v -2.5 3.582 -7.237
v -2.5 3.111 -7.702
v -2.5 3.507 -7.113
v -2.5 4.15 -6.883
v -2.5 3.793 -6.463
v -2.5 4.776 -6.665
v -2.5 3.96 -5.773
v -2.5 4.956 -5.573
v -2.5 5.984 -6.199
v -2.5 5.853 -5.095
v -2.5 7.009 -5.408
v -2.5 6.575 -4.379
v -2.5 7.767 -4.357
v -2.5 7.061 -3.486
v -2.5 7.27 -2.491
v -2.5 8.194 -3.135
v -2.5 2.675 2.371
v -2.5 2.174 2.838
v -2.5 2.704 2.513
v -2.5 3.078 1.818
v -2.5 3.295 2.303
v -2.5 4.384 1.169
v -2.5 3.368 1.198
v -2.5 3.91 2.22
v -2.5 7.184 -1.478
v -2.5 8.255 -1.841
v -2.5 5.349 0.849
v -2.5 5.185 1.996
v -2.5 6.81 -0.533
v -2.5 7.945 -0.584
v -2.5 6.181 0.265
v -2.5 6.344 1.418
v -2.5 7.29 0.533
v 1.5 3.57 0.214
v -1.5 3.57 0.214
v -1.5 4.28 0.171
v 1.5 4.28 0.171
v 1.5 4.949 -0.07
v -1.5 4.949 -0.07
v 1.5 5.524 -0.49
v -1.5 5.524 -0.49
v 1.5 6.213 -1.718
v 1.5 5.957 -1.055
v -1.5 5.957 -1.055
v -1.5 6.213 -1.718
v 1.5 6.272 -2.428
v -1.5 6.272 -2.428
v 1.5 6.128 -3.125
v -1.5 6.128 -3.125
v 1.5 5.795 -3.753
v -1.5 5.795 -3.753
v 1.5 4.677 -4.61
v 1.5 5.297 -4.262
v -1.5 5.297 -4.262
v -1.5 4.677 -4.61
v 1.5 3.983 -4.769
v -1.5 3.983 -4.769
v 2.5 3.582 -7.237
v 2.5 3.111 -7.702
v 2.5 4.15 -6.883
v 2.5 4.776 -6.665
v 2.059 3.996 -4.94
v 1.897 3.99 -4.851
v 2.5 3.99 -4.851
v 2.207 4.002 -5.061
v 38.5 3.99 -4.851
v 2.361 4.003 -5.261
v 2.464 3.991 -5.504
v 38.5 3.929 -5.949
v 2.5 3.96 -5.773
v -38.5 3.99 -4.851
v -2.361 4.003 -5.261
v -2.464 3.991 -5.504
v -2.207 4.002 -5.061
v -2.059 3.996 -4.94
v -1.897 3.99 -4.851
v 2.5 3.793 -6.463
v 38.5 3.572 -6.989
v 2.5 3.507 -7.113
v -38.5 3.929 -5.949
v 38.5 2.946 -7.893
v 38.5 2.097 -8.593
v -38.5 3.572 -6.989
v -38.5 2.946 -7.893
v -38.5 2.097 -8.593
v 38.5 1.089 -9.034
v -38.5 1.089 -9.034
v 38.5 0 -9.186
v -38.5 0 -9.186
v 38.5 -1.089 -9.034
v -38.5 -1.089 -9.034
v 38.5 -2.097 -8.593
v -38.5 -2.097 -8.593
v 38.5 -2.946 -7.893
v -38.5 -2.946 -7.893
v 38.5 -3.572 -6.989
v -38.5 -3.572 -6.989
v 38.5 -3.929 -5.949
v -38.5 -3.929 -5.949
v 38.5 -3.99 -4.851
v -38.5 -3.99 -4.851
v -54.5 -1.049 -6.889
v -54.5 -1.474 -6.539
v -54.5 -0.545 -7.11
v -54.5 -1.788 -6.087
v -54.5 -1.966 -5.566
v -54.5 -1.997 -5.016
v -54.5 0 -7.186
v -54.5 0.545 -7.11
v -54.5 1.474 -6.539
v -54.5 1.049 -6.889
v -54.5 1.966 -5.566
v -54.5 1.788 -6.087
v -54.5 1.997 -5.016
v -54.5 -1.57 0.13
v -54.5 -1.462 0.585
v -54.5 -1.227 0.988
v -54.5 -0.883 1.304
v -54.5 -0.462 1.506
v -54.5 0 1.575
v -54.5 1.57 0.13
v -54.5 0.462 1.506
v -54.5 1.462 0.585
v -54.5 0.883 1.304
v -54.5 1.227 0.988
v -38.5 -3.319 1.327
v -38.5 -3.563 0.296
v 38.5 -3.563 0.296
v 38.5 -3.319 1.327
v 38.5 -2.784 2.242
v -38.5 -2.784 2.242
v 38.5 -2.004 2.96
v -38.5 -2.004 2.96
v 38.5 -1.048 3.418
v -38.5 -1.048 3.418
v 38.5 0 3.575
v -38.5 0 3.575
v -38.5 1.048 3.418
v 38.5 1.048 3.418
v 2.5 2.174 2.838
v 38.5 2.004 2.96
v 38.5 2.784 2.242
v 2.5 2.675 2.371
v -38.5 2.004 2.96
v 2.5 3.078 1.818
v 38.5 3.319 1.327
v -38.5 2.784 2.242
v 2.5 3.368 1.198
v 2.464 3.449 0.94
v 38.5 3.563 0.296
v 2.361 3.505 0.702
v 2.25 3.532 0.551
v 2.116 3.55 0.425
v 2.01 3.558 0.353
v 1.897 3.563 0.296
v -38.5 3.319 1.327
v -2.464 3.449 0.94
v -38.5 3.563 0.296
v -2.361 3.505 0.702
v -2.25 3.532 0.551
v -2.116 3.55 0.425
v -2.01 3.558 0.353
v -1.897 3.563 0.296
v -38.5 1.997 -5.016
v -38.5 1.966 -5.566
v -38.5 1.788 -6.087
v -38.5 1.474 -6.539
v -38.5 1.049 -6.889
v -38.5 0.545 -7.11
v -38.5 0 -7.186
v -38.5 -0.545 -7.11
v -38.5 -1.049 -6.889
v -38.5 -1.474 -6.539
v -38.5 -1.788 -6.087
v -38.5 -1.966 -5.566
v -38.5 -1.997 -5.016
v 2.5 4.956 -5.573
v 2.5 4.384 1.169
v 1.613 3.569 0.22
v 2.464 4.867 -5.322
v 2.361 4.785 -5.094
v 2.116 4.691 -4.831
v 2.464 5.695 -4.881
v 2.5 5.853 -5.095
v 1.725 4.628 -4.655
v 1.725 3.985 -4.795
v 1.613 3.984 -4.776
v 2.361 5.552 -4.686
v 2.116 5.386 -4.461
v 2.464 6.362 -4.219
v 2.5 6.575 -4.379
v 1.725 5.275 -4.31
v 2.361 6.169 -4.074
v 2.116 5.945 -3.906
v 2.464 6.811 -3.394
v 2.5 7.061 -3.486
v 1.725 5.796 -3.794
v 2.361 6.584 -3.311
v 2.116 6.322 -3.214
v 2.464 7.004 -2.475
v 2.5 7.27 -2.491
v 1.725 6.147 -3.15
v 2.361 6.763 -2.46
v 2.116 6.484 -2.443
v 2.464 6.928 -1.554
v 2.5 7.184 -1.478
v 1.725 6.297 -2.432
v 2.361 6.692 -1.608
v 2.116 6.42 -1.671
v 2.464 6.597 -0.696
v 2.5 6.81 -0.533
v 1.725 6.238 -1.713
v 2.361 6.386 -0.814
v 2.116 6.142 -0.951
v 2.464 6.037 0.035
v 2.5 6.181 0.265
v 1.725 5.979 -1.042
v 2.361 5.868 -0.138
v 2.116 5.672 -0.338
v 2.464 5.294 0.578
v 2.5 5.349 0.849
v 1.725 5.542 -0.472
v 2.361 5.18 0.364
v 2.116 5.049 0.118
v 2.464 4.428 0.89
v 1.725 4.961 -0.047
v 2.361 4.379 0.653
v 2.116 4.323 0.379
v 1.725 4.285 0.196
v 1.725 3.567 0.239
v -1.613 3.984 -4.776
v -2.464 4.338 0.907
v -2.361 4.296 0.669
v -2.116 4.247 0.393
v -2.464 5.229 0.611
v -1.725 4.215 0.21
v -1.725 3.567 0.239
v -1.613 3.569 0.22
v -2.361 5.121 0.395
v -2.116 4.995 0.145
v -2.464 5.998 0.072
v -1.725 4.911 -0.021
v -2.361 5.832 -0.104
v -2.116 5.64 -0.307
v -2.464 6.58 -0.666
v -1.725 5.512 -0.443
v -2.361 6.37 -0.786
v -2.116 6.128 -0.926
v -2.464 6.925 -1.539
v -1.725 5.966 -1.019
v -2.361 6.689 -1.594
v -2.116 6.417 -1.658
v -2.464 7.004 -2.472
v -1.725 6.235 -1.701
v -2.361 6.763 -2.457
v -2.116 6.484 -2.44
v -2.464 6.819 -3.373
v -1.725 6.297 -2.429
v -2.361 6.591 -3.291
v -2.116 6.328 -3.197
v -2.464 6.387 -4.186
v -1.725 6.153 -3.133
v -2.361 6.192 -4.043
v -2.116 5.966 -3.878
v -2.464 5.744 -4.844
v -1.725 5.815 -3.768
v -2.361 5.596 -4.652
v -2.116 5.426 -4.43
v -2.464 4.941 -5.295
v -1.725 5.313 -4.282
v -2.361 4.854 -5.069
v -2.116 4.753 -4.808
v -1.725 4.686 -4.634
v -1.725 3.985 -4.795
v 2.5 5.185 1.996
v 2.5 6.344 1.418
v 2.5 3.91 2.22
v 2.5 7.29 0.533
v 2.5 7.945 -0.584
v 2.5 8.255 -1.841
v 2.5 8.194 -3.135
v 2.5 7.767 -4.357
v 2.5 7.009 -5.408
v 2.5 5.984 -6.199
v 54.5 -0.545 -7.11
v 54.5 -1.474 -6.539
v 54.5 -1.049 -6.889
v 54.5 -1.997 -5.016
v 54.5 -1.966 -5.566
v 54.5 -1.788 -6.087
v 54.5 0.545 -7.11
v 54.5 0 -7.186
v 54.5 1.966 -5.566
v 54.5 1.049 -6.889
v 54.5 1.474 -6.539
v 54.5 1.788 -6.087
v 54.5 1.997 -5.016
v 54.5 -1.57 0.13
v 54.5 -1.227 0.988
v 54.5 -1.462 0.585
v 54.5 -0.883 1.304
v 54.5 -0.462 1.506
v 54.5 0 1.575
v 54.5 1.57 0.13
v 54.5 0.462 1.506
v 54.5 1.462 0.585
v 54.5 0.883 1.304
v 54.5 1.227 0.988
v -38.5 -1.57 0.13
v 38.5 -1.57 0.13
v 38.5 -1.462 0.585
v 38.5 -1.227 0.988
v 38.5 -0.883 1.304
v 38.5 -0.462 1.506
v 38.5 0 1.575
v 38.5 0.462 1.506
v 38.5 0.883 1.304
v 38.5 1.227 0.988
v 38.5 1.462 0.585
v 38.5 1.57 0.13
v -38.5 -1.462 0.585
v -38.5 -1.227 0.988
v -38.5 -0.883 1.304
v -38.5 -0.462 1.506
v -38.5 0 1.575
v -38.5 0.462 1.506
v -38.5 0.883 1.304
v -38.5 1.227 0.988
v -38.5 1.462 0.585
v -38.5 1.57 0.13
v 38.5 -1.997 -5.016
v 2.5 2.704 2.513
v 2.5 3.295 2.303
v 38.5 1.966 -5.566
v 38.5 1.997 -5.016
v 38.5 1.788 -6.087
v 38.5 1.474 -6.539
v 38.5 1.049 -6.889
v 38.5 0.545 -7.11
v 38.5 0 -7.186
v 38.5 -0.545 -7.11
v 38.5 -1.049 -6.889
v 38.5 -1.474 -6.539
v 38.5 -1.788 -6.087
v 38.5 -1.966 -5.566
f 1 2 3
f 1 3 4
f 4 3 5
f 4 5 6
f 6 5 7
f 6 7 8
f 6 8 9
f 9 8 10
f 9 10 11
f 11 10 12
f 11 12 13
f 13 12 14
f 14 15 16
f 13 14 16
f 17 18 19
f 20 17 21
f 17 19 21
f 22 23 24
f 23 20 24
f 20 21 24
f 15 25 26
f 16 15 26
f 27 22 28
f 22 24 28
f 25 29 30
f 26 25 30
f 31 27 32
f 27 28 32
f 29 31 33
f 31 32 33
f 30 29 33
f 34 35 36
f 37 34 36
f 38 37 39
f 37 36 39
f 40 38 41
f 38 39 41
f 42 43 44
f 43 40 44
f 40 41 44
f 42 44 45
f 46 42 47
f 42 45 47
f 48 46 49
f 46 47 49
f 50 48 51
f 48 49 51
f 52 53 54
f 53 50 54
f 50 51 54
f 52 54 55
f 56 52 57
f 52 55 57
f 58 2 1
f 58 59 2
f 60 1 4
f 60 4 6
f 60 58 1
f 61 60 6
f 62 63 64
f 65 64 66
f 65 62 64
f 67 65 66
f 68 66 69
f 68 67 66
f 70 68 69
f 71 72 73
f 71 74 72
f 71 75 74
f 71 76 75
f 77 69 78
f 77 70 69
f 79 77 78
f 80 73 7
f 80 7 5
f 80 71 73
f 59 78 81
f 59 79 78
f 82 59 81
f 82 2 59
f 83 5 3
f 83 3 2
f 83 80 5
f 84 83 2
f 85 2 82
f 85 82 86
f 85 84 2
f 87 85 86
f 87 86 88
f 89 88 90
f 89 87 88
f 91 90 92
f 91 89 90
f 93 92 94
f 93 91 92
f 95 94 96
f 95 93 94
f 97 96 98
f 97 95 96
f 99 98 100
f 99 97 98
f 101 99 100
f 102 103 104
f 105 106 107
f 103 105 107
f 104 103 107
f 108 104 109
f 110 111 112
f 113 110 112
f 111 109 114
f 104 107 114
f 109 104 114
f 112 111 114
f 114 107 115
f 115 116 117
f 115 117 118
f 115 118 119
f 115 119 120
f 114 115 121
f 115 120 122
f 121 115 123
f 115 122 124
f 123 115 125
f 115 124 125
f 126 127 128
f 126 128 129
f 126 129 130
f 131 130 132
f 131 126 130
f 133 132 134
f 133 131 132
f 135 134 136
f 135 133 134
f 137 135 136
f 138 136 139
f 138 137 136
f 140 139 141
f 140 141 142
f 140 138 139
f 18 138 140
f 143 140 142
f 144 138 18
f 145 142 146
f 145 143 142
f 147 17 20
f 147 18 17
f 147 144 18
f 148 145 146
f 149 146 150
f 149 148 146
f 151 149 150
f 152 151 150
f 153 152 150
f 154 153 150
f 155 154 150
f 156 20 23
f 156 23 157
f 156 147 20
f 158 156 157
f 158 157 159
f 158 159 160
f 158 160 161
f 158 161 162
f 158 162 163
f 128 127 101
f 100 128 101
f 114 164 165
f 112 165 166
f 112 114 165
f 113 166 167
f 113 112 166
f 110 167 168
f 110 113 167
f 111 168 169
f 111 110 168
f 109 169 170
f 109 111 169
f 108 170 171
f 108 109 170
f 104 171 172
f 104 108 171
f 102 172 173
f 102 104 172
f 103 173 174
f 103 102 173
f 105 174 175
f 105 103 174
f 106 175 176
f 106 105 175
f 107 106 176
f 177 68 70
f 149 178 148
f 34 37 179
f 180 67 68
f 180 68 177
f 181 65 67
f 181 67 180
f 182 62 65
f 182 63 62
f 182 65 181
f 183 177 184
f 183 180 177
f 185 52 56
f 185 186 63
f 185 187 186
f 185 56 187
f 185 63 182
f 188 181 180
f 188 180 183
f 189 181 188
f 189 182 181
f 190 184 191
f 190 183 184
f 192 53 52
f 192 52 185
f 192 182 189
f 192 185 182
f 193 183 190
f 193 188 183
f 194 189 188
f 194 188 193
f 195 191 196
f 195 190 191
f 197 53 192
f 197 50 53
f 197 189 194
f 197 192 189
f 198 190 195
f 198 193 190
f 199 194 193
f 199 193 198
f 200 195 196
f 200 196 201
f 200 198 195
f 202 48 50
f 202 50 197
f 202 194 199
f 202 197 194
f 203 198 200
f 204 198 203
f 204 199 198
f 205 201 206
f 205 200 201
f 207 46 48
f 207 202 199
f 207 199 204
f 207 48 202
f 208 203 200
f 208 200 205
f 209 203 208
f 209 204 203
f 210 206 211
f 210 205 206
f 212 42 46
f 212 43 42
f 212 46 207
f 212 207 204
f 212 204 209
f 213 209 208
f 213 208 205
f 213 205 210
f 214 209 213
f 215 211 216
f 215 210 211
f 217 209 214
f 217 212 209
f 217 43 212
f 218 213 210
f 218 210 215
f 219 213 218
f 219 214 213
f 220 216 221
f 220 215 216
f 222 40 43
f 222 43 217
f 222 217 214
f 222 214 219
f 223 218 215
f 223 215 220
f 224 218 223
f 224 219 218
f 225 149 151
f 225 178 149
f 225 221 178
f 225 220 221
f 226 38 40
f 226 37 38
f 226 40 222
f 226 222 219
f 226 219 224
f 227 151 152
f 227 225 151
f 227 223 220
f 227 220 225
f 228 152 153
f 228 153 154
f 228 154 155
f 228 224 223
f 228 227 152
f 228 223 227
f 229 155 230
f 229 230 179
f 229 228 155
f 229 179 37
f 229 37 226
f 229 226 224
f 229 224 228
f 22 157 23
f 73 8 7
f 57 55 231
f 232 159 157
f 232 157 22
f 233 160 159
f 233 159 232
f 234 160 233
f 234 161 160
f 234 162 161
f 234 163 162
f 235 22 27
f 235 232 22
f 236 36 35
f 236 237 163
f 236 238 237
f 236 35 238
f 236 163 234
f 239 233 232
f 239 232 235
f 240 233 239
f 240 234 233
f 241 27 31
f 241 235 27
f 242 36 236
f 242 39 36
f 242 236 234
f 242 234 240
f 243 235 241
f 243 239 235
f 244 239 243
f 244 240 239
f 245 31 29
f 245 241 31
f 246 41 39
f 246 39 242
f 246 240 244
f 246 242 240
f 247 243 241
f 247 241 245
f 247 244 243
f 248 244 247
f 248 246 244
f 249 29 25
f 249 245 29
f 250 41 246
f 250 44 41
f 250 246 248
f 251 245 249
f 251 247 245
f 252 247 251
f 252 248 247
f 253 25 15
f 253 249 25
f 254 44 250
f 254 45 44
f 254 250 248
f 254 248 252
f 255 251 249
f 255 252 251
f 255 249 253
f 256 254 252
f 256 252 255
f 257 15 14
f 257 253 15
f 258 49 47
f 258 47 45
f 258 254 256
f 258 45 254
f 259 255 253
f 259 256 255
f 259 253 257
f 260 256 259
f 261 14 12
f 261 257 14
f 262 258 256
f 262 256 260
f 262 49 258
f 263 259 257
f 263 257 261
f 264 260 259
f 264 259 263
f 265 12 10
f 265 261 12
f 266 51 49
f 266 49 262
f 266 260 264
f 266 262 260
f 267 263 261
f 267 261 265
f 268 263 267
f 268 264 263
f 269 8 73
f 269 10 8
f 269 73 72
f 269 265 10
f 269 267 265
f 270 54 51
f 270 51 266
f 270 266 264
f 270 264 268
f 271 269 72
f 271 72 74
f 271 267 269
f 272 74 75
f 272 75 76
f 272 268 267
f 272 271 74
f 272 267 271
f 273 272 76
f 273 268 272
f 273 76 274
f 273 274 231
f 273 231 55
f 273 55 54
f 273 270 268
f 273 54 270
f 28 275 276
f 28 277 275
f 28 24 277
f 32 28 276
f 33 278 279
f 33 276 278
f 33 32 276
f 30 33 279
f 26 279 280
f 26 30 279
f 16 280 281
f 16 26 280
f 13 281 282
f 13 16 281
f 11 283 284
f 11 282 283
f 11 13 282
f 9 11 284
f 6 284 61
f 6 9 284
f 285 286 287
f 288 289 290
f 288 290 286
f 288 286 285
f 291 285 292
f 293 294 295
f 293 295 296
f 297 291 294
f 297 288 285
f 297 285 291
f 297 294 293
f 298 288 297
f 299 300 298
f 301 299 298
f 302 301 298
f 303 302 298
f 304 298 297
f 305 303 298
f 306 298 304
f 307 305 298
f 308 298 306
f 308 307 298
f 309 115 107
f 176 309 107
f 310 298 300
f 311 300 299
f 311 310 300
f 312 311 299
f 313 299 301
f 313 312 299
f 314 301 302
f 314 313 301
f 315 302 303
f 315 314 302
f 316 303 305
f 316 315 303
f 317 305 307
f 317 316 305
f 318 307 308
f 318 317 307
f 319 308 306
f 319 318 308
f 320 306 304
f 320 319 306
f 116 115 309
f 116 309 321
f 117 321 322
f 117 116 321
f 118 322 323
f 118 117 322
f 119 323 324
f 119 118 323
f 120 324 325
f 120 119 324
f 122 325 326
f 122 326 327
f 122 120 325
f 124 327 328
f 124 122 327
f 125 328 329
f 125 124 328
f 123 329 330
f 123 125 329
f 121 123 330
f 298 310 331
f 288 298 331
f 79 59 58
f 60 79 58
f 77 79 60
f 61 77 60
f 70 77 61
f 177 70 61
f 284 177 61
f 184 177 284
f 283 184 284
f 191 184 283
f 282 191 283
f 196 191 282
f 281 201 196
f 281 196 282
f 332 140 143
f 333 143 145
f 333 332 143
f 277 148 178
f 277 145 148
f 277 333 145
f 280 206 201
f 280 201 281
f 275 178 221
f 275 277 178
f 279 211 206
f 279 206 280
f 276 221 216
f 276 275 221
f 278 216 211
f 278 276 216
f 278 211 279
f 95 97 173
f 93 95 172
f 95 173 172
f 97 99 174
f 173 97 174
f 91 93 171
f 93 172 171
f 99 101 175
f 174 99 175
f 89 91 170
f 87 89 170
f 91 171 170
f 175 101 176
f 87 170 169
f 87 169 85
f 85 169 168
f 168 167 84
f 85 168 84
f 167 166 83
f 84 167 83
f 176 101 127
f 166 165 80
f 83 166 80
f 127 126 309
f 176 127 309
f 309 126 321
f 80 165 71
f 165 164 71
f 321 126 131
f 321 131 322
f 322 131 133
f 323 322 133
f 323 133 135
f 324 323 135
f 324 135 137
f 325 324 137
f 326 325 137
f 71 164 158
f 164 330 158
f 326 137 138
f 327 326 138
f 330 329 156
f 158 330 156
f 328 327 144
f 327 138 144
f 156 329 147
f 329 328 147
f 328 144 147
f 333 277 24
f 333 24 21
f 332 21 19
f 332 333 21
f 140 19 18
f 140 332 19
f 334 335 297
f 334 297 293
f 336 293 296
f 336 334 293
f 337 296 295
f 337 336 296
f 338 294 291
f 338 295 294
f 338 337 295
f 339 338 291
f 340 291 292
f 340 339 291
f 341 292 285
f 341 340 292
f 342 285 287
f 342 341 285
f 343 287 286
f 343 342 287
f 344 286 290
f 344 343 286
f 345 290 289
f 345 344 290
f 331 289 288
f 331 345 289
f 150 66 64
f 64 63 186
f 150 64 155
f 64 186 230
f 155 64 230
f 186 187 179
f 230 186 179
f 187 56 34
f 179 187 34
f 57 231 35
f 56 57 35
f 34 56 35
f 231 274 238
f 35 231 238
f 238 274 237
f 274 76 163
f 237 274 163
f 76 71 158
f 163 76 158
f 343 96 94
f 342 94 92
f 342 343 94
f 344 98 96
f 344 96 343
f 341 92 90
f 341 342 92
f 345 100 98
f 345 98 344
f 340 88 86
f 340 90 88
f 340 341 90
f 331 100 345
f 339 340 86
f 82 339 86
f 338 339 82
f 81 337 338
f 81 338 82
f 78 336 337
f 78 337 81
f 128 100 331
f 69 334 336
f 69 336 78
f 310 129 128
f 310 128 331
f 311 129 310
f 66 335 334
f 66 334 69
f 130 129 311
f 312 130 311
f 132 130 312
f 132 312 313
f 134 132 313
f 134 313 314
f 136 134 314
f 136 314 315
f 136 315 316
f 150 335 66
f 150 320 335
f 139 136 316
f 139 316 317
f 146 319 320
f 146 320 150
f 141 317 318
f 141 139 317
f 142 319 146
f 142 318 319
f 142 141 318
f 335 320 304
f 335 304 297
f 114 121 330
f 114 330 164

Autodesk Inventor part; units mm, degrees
ref_plane "YZ Plane" through (0, 0, 0) normal (1, 0, 0) x (0, 1, 0)
ref_plane "XZ Plane" through (0, 0, 0) normal (0, 1, 0) x (-1, 0, 0)
ref_plane "XY Plane" through (0, 0, 0) normal (0, 0, 1) x (1, 0, 0)
sketch "Sketch1" plane through (0, 0, 0) normal (1, 0, 0) x (0, 1, 0)
  arc A0 (1.569606, 0.130237) -> (-1.569606, 0.130237) centre (0, 0) ccw
  arc A1 (-1.996639, -5.01633) -> (1.996639, -5.01633) centre (0, -5.182) ccw
  line L0 (1.569606, 0.130237) -> (1.996639, -5.01633)
  line L1 (-1.569606, 0.130237) -> (-1.996639, -5.01633)
  arc A2 (1.996639, -5.01633) -> (-1.996639, -5.01633) centre (0, -5.182) ccw construction
  arc A3 (-1.569606, 0.130237) -> (1.569606, 0.130237) centre (0, 0) ccw construction
  line L2 (3.989789, -4.85095) -> (3.562757, 0.295617)
  arc A4 (3.562757, 0.295617) -> (-3.562757, 0.295617) centre (0, 0) ccw
  line L3 (-3.562757, 0.295617) -> (-3.989789, -4.85095)
  arc A5 (-3.989789, -4.85095) -> (3.989789, -4.85095) centre (0, -5.182) ccw
  arc A6 (3.982998, -4.769105) -> (3.569548, 0.213772) centre (3.776273, -2.277667) ccw
  arc A7 (0.970465, 1.240493) -> (3.672287, -6.776465) centre (3.776273, -2.277667) ccw construction
  arc A8 (2.870948, 2.130325) -> (0.970465, 1.240493) centre (3.776273, -2.277667) ccw construction
  arc A9 (3.672287, -6.776465) -> (2.870948, 2.130325) centre (3.776273, -2.277667) ccw
  arc A10 (1.907157, -3.93791) -> (3.982998, -4.769105) centre (3.776273, -2.277667) ccw construction
  arc A11 (3.569548, 0.213772) -> (1.907157, -3.93791) centre (3.776273, -2.277667) ccw construction
  point P0 (-1.527231, 0.384956)
  point P1 (-1.942735, -4.692312)
  point P2 (1.569795, -0.127934)
  point P3 (1.996879, -5.344741)
  dimension "d12" = 0
  dimension "d0" = 5.182
  dimension "d1" = 0
  dimension "d2" = 3.15
  dimension "d3" = 4.007
  dimension "d4" = 2
  dimension "d9" = 5
  dimension "d10" = 9
extrude "Extrusion1" add sketch "Sketch1" along normal mid plane 77 contours L0 A1 L1 A0 | A5 L3 A4 L2
extrude "Extrusion2" add sketch "Sketch1" along normal mid plane 109 contours L0 A1 L1 A0
extrude "Extrusion3" add sketch "Sketch1" along normal mid plane 5 contours L2 A6 A4 A9 A5
fillet "Fillet1" radius 3 2 edges at (0, 3.6723, -6.7765) (0, 2.8709, 2.1303)
fillet "Fillet2" radius 1 2 edges at (2.5, 6.2677, -2.0709) (-2.5, 6.2677, -2.0709)
properties part number "ChargingArm - ConnectingBrace"
